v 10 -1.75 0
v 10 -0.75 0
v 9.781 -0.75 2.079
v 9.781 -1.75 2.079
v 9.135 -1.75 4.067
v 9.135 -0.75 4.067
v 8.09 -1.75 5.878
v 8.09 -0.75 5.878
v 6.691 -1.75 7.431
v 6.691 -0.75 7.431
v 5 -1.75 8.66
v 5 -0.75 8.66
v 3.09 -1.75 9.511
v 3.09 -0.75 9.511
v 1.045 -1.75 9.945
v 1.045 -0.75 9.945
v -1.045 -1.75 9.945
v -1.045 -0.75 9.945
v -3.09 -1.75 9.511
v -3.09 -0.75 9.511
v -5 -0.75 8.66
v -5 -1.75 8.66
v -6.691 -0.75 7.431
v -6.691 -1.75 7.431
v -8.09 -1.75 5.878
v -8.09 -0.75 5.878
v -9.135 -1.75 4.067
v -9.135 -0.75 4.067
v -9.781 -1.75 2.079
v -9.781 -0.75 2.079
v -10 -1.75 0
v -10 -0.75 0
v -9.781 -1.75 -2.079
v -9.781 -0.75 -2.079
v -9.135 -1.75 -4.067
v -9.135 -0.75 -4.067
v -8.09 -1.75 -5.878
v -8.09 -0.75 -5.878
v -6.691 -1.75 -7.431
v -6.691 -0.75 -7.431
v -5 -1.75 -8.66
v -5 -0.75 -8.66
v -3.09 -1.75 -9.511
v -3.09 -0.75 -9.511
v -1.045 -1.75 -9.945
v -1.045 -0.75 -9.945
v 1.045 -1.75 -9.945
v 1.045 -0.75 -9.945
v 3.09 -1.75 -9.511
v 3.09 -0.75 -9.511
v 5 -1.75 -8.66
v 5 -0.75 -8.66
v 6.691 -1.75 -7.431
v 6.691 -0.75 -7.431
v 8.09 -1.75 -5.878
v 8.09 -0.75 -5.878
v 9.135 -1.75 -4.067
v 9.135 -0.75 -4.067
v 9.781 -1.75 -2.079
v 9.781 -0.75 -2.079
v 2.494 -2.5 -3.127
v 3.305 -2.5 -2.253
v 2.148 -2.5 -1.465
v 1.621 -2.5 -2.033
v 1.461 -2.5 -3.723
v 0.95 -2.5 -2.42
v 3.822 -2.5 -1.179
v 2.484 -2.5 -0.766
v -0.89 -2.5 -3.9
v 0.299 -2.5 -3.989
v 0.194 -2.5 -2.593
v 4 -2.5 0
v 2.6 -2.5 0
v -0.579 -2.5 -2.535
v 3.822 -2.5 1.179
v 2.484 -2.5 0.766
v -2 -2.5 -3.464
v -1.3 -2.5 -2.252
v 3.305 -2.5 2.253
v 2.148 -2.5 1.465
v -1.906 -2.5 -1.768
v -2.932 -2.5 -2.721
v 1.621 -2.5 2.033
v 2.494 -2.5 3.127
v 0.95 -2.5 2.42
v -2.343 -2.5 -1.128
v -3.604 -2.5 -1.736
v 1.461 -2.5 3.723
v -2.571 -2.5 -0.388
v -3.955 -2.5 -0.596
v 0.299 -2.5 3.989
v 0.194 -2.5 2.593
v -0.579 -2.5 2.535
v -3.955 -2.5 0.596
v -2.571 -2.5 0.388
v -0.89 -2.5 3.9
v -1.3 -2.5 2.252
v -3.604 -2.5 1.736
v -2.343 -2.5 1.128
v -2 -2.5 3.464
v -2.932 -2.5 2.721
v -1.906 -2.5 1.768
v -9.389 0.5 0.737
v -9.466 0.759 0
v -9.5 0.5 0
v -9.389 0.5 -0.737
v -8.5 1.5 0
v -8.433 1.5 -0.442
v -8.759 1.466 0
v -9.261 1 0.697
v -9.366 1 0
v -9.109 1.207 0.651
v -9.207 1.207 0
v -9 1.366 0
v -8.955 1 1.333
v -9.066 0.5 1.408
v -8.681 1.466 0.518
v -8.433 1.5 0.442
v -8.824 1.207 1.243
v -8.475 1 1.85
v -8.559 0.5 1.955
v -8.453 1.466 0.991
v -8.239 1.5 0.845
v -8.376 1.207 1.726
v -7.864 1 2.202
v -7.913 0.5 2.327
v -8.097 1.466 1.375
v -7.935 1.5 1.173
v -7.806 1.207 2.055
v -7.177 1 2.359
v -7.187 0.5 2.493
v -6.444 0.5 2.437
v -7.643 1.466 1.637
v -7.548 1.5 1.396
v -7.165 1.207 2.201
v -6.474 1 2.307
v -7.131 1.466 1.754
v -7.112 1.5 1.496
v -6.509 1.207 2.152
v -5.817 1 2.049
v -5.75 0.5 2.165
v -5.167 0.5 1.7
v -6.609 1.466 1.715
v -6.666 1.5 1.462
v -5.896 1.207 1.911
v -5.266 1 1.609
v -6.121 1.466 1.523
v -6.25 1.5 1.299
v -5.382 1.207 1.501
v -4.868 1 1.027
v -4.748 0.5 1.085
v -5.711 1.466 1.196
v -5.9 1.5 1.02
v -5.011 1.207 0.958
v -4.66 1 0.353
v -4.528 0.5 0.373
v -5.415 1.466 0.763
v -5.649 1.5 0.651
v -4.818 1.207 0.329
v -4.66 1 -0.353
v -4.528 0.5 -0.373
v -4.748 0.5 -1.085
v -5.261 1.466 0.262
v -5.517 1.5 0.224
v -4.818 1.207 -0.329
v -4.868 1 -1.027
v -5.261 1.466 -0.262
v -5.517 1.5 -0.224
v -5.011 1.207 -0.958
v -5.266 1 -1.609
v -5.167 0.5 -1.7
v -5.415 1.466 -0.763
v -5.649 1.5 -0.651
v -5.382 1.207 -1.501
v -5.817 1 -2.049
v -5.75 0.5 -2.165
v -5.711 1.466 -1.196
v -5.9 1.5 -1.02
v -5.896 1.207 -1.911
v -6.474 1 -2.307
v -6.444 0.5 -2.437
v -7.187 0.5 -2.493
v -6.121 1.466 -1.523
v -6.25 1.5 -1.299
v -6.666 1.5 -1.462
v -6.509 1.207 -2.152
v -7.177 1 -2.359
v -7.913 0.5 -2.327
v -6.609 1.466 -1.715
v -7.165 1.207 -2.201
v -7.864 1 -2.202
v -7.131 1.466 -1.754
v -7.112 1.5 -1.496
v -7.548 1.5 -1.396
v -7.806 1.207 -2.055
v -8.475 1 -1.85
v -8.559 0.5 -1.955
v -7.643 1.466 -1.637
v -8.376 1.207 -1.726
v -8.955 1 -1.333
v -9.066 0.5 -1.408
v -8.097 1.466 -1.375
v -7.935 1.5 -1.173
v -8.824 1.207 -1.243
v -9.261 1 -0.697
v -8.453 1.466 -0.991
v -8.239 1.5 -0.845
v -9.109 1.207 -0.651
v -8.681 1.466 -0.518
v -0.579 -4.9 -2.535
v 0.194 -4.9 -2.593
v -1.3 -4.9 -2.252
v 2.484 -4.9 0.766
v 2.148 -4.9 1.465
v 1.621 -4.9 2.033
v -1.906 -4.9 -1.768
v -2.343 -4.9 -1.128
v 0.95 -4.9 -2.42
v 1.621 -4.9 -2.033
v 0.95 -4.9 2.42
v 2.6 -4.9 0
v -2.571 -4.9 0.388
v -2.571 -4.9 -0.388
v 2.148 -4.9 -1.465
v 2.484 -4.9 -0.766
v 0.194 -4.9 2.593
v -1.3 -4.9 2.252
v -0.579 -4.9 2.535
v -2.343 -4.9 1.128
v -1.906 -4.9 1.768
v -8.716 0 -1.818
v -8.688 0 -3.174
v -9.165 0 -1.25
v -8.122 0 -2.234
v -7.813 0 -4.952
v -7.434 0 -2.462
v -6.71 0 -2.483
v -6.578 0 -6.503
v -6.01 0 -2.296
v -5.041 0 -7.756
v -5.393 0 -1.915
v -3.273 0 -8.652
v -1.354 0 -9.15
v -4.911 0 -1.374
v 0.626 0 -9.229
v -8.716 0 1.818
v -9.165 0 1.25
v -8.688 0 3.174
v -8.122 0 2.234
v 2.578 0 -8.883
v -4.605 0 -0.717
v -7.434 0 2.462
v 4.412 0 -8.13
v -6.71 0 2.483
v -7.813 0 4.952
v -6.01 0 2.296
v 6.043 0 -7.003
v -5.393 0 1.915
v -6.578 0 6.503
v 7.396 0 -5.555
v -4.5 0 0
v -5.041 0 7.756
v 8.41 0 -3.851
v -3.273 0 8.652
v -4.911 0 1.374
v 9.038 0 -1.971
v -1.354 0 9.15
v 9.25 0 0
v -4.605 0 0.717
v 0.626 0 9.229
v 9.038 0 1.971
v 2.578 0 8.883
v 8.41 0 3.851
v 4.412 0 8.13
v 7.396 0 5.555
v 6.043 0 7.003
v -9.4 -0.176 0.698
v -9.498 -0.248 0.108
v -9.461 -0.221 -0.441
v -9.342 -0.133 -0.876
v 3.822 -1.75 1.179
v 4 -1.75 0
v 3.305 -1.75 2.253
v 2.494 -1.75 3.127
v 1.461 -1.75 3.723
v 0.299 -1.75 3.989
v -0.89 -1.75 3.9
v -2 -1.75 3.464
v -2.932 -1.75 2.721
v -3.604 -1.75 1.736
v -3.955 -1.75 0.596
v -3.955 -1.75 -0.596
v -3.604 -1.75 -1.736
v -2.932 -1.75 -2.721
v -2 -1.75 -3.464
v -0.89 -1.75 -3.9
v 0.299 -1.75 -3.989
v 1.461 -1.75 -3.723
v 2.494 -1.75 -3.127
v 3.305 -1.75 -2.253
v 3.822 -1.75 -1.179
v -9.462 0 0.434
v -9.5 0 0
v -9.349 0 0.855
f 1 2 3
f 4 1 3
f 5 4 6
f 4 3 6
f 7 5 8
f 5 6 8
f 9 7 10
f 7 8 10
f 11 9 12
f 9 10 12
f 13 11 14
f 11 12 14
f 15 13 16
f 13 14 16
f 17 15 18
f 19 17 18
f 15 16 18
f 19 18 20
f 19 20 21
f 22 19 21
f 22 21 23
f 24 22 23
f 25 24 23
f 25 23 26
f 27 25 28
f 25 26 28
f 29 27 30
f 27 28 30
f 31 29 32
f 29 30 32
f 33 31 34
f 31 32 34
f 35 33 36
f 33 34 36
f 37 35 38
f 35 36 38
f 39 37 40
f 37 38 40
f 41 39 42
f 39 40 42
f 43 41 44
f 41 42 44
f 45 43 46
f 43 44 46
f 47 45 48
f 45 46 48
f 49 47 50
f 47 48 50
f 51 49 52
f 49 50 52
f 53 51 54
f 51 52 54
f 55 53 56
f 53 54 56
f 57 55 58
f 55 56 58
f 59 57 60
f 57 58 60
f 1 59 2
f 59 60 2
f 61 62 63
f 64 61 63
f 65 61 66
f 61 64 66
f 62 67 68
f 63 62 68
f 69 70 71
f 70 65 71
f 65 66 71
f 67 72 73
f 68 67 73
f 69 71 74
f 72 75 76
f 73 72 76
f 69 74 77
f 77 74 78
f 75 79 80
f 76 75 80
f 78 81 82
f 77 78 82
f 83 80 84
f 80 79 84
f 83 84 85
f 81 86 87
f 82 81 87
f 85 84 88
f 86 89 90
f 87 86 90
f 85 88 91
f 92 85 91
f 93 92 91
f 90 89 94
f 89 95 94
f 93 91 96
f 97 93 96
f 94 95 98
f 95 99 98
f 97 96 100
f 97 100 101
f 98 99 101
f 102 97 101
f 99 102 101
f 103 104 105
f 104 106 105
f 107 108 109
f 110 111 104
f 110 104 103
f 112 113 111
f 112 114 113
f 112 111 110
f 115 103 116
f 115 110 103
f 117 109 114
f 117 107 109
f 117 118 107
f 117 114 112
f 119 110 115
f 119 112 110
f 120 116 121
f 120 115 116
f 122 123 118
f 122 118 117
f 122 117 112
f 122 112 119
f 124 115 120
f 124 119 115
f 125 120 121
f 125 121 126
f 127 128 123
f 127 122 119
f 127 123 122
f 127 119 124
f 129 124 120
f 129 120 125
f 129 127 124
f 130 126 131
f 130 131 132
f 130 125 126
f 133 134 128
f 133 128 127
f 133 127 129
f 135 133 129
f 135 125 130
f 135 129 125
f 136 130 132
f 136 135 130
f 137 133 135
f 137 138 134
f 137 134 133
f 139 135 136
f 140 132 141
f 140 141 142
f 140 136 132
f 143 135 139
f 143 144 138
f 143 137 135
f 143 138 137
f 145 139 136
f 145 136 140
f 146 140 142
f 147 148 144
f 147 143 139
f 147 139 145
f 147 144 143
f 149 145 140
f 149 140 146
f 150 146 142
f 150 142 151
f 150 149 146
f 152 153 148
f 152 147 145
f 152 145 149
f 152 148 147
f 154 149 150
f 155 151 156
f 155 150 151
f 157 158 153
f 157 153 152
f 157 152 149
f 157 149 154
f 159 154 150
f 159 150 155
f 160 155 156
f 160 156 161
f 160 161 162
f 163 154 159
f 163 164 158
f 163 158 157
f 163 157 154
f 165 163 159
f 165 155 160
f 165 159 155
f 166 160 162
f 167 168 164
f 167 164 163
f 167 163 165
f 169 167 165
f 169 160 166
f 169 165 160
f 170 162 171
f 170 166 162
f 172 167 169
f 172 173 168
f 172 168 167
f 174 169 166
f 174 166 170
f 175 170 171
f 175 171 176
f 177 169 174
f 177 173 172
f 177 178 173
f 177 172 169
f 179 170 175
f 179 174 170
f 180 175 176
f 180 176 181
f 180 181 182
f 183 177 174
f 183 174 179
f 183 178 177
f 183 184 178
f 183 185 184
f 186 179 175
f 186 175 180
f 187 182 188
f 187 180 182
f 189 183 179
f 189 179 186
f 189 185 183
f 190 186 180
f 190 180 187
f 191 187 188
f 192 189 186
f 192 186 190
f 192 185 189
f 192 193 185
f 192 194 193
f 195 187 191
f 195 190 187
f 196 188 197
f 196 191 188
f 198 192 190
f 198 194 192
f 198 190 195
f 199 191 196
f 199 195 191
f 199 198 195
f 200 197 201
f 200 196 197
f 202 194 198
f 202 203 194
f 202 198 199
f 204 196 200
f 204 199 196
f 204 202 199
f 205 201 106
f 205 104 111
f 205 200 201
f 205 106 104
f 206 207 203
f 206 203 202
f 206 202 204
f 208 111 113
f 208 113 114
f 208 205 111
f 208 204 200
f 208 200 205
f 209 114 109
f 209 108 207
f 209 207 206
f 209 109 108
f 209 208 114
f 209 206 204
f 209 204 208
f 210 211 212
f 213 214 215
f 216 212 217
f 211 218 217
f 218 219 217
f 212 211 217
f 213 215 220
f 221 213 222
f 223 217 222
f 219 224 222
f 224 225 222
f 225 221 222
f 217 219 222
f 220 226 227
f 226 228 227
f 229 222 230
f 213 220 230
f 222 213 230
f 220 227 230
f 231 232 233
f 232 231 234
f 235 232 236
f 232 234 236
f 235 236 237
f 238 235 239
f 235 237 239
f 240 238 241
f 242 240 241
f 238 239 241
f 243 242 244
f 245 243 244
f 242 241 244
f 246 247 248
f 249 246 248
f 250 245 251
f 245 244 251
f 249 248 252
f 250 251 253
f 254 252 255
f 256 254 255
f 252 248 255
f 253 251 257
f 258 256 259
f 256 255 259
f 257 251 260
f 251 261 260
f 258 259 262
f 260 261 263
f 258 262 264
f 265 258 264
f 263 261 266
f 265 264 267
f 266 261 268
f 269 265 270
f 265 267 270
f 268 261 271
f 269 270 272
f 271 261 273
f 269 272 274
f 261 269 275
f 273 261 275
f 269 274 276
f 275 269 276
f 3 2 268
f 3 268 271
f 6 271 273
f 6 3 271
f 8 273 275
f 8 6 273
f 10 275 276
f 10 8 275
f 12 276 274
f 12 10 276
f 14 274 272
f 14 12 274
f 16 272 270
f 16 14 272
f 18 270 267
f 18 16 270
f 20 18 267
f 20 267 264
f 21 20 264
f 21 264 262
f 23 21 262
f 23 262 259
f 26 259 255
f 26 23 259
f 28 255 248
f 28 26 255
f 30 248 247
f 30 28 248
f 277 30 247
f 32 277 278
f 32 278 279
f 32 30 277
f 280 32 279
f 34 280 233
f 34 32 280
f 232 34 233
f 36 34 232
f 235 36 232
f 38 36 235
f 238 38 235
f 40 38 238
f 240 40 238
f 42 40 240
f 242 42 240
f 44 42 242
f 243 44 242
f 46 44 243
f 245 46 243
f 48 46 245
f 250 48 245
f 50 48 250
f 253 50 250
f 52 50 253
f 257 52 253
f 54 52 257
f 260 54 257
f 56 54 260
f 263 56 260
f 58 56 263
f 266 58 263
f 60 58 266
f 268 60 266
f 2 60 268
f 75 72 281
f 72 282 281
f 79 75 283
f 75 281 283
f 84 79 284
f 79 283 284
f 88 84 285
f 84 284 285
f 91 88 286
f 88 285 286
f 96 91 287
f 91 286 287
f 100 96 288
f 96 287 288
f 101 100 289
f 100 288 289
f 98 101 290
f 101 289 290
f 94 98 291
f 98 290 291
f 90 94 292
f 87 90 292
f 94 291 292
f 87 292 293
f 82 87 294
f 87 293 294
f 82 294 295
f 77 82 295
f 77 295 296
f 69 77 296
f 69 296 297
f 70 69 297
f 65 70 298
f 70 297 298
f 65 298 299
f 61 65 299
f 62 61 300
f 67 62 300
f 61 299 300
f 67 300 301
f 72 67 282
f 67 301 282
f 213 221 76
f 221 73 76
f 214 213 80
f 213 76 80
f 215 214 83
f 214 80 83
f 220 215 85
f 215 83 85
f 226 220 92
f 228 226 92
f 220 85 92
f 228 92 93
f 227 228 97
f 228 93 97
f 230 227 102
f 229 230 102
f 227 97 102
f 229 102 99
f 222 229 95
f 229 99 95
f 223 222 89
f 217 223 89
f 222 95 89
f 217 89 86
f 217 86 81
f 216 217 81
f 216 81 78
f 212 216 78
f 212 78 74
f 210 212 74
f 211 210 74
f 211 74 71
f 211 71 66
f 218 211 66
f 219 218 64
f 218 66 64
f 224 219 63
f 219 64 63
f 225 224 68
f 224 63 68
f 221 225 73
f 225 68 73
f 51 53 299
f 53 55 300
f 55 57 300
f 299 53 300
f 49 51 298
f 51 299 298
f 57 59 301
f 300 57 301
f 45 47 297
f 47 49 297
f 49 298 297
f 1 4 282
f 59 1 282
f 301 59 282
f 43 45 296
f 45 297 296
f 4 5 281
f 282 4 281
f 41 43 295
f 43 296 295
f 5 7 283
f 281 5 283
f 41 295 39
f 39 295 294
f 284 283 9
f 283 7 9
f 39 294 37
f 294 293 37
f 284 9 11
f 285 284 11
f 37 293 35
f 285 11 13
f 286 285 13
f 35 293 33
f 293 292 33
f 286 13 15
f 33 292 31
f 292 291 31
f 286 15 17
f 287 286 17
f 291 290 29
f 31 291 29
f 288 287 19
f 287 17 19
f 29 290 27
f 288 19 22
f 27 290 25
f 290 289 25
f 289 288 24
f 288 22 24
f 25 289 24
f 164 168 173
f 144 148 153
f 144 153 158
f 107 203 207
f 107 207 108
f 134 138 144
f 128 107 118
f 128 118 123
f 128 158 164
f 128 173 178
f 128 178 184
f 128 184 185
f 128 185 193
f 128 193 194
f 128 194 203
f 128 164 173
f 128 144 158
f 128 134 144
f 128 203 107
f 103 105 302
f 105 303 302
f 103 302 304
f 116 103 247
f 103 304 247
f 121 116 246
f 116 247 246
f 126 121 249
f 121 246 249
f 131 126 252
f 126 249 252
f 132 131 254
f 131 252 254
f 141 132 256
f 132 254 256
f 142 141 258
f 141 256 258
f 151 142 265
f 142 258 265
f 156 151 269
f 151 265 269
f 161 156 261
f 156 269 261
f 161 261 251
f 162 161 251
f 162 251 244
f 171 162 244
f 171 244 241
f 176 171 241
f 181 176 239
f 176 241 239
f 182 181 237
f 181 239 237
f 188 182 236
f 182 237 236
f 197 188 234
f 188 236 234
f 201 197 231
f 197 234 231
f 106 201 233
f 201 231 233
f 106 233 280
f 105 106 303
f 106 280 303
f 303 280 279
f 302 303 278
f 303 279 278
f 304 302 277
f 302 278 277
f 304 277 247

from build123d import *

# Parameters (mm, degrees)
F2_R        = 2.5
F3_DEPTH    = 1.5
F4_R        = 1
F5_S5_R     = 2.5
F5_T6_DEPTH = 16


# Not quite as in the source:
# - a fillet or chamfer that OpenCascade refuses, or shapes differently, is made with other operations: its cross-section is extruded or revolved along the edge and cut away or added


with BuildPart() as f1:
    # F0 (on Top) → F1 (revolve)
    with BuildSketch(Plane.XY):
        Polygon((0, 0), (0, -4.9), (2.6, -4.9), (2.6, -2.8), (2.6, -2.5), (4, -2.5), (4, -1.75), (10, -1.75), (10, 0), align=None)
    revolve(axis=Axis((0, -2.45, 0), (0, -1, 0)))

    # F2 (on face) → F3 (join)
    with BuildSketch(Plane(origin=(0, 0, 0), x_dir=(-1, 0, 0), z_dir=(0, 1, 0))):
        with Locations((7, 0)):
            Circle(F2_R)
    extrude(amount=F3_DEPTH)

    # F4
    f4_edges = [f1.edges().sort_by_distance(p)[0] for p in [
        (-4.5, 1.5, 0),
    ]]
    fillet(f4_edges, radius=F4_R)

    # F5: chamfer of 0.75 on 1 edges, made by hand


with BuildPart() as f5_tool2:
    # F5_s3 → F5_t4 (revolve)
    with BuildSketch(Plane.XY):
        Polygon((9.25, 0), (10, -0.75), (10, 0), align=None)
    revolve(axis=Axis((0, 0, 0), (0, -1, 0)))

    # F5_s5 → F5_t6 (cut, symmetric)
    with BuildSketch(Plane.XZ.offset(0.4)):
        with Locations((-7, 0)):
            Circle(F5_S5_R)
    extrude(amount=F5_T6_DEPTH, both=True, mode=Mode.SUBTRACT)


with BuildPart() as f1_1:
    add(f1.part)

    # F5_t1: cut F5_tool2
    add(f5_tool2.part, mode=Mode.SUBTRACT)


solid = f1_1.part
